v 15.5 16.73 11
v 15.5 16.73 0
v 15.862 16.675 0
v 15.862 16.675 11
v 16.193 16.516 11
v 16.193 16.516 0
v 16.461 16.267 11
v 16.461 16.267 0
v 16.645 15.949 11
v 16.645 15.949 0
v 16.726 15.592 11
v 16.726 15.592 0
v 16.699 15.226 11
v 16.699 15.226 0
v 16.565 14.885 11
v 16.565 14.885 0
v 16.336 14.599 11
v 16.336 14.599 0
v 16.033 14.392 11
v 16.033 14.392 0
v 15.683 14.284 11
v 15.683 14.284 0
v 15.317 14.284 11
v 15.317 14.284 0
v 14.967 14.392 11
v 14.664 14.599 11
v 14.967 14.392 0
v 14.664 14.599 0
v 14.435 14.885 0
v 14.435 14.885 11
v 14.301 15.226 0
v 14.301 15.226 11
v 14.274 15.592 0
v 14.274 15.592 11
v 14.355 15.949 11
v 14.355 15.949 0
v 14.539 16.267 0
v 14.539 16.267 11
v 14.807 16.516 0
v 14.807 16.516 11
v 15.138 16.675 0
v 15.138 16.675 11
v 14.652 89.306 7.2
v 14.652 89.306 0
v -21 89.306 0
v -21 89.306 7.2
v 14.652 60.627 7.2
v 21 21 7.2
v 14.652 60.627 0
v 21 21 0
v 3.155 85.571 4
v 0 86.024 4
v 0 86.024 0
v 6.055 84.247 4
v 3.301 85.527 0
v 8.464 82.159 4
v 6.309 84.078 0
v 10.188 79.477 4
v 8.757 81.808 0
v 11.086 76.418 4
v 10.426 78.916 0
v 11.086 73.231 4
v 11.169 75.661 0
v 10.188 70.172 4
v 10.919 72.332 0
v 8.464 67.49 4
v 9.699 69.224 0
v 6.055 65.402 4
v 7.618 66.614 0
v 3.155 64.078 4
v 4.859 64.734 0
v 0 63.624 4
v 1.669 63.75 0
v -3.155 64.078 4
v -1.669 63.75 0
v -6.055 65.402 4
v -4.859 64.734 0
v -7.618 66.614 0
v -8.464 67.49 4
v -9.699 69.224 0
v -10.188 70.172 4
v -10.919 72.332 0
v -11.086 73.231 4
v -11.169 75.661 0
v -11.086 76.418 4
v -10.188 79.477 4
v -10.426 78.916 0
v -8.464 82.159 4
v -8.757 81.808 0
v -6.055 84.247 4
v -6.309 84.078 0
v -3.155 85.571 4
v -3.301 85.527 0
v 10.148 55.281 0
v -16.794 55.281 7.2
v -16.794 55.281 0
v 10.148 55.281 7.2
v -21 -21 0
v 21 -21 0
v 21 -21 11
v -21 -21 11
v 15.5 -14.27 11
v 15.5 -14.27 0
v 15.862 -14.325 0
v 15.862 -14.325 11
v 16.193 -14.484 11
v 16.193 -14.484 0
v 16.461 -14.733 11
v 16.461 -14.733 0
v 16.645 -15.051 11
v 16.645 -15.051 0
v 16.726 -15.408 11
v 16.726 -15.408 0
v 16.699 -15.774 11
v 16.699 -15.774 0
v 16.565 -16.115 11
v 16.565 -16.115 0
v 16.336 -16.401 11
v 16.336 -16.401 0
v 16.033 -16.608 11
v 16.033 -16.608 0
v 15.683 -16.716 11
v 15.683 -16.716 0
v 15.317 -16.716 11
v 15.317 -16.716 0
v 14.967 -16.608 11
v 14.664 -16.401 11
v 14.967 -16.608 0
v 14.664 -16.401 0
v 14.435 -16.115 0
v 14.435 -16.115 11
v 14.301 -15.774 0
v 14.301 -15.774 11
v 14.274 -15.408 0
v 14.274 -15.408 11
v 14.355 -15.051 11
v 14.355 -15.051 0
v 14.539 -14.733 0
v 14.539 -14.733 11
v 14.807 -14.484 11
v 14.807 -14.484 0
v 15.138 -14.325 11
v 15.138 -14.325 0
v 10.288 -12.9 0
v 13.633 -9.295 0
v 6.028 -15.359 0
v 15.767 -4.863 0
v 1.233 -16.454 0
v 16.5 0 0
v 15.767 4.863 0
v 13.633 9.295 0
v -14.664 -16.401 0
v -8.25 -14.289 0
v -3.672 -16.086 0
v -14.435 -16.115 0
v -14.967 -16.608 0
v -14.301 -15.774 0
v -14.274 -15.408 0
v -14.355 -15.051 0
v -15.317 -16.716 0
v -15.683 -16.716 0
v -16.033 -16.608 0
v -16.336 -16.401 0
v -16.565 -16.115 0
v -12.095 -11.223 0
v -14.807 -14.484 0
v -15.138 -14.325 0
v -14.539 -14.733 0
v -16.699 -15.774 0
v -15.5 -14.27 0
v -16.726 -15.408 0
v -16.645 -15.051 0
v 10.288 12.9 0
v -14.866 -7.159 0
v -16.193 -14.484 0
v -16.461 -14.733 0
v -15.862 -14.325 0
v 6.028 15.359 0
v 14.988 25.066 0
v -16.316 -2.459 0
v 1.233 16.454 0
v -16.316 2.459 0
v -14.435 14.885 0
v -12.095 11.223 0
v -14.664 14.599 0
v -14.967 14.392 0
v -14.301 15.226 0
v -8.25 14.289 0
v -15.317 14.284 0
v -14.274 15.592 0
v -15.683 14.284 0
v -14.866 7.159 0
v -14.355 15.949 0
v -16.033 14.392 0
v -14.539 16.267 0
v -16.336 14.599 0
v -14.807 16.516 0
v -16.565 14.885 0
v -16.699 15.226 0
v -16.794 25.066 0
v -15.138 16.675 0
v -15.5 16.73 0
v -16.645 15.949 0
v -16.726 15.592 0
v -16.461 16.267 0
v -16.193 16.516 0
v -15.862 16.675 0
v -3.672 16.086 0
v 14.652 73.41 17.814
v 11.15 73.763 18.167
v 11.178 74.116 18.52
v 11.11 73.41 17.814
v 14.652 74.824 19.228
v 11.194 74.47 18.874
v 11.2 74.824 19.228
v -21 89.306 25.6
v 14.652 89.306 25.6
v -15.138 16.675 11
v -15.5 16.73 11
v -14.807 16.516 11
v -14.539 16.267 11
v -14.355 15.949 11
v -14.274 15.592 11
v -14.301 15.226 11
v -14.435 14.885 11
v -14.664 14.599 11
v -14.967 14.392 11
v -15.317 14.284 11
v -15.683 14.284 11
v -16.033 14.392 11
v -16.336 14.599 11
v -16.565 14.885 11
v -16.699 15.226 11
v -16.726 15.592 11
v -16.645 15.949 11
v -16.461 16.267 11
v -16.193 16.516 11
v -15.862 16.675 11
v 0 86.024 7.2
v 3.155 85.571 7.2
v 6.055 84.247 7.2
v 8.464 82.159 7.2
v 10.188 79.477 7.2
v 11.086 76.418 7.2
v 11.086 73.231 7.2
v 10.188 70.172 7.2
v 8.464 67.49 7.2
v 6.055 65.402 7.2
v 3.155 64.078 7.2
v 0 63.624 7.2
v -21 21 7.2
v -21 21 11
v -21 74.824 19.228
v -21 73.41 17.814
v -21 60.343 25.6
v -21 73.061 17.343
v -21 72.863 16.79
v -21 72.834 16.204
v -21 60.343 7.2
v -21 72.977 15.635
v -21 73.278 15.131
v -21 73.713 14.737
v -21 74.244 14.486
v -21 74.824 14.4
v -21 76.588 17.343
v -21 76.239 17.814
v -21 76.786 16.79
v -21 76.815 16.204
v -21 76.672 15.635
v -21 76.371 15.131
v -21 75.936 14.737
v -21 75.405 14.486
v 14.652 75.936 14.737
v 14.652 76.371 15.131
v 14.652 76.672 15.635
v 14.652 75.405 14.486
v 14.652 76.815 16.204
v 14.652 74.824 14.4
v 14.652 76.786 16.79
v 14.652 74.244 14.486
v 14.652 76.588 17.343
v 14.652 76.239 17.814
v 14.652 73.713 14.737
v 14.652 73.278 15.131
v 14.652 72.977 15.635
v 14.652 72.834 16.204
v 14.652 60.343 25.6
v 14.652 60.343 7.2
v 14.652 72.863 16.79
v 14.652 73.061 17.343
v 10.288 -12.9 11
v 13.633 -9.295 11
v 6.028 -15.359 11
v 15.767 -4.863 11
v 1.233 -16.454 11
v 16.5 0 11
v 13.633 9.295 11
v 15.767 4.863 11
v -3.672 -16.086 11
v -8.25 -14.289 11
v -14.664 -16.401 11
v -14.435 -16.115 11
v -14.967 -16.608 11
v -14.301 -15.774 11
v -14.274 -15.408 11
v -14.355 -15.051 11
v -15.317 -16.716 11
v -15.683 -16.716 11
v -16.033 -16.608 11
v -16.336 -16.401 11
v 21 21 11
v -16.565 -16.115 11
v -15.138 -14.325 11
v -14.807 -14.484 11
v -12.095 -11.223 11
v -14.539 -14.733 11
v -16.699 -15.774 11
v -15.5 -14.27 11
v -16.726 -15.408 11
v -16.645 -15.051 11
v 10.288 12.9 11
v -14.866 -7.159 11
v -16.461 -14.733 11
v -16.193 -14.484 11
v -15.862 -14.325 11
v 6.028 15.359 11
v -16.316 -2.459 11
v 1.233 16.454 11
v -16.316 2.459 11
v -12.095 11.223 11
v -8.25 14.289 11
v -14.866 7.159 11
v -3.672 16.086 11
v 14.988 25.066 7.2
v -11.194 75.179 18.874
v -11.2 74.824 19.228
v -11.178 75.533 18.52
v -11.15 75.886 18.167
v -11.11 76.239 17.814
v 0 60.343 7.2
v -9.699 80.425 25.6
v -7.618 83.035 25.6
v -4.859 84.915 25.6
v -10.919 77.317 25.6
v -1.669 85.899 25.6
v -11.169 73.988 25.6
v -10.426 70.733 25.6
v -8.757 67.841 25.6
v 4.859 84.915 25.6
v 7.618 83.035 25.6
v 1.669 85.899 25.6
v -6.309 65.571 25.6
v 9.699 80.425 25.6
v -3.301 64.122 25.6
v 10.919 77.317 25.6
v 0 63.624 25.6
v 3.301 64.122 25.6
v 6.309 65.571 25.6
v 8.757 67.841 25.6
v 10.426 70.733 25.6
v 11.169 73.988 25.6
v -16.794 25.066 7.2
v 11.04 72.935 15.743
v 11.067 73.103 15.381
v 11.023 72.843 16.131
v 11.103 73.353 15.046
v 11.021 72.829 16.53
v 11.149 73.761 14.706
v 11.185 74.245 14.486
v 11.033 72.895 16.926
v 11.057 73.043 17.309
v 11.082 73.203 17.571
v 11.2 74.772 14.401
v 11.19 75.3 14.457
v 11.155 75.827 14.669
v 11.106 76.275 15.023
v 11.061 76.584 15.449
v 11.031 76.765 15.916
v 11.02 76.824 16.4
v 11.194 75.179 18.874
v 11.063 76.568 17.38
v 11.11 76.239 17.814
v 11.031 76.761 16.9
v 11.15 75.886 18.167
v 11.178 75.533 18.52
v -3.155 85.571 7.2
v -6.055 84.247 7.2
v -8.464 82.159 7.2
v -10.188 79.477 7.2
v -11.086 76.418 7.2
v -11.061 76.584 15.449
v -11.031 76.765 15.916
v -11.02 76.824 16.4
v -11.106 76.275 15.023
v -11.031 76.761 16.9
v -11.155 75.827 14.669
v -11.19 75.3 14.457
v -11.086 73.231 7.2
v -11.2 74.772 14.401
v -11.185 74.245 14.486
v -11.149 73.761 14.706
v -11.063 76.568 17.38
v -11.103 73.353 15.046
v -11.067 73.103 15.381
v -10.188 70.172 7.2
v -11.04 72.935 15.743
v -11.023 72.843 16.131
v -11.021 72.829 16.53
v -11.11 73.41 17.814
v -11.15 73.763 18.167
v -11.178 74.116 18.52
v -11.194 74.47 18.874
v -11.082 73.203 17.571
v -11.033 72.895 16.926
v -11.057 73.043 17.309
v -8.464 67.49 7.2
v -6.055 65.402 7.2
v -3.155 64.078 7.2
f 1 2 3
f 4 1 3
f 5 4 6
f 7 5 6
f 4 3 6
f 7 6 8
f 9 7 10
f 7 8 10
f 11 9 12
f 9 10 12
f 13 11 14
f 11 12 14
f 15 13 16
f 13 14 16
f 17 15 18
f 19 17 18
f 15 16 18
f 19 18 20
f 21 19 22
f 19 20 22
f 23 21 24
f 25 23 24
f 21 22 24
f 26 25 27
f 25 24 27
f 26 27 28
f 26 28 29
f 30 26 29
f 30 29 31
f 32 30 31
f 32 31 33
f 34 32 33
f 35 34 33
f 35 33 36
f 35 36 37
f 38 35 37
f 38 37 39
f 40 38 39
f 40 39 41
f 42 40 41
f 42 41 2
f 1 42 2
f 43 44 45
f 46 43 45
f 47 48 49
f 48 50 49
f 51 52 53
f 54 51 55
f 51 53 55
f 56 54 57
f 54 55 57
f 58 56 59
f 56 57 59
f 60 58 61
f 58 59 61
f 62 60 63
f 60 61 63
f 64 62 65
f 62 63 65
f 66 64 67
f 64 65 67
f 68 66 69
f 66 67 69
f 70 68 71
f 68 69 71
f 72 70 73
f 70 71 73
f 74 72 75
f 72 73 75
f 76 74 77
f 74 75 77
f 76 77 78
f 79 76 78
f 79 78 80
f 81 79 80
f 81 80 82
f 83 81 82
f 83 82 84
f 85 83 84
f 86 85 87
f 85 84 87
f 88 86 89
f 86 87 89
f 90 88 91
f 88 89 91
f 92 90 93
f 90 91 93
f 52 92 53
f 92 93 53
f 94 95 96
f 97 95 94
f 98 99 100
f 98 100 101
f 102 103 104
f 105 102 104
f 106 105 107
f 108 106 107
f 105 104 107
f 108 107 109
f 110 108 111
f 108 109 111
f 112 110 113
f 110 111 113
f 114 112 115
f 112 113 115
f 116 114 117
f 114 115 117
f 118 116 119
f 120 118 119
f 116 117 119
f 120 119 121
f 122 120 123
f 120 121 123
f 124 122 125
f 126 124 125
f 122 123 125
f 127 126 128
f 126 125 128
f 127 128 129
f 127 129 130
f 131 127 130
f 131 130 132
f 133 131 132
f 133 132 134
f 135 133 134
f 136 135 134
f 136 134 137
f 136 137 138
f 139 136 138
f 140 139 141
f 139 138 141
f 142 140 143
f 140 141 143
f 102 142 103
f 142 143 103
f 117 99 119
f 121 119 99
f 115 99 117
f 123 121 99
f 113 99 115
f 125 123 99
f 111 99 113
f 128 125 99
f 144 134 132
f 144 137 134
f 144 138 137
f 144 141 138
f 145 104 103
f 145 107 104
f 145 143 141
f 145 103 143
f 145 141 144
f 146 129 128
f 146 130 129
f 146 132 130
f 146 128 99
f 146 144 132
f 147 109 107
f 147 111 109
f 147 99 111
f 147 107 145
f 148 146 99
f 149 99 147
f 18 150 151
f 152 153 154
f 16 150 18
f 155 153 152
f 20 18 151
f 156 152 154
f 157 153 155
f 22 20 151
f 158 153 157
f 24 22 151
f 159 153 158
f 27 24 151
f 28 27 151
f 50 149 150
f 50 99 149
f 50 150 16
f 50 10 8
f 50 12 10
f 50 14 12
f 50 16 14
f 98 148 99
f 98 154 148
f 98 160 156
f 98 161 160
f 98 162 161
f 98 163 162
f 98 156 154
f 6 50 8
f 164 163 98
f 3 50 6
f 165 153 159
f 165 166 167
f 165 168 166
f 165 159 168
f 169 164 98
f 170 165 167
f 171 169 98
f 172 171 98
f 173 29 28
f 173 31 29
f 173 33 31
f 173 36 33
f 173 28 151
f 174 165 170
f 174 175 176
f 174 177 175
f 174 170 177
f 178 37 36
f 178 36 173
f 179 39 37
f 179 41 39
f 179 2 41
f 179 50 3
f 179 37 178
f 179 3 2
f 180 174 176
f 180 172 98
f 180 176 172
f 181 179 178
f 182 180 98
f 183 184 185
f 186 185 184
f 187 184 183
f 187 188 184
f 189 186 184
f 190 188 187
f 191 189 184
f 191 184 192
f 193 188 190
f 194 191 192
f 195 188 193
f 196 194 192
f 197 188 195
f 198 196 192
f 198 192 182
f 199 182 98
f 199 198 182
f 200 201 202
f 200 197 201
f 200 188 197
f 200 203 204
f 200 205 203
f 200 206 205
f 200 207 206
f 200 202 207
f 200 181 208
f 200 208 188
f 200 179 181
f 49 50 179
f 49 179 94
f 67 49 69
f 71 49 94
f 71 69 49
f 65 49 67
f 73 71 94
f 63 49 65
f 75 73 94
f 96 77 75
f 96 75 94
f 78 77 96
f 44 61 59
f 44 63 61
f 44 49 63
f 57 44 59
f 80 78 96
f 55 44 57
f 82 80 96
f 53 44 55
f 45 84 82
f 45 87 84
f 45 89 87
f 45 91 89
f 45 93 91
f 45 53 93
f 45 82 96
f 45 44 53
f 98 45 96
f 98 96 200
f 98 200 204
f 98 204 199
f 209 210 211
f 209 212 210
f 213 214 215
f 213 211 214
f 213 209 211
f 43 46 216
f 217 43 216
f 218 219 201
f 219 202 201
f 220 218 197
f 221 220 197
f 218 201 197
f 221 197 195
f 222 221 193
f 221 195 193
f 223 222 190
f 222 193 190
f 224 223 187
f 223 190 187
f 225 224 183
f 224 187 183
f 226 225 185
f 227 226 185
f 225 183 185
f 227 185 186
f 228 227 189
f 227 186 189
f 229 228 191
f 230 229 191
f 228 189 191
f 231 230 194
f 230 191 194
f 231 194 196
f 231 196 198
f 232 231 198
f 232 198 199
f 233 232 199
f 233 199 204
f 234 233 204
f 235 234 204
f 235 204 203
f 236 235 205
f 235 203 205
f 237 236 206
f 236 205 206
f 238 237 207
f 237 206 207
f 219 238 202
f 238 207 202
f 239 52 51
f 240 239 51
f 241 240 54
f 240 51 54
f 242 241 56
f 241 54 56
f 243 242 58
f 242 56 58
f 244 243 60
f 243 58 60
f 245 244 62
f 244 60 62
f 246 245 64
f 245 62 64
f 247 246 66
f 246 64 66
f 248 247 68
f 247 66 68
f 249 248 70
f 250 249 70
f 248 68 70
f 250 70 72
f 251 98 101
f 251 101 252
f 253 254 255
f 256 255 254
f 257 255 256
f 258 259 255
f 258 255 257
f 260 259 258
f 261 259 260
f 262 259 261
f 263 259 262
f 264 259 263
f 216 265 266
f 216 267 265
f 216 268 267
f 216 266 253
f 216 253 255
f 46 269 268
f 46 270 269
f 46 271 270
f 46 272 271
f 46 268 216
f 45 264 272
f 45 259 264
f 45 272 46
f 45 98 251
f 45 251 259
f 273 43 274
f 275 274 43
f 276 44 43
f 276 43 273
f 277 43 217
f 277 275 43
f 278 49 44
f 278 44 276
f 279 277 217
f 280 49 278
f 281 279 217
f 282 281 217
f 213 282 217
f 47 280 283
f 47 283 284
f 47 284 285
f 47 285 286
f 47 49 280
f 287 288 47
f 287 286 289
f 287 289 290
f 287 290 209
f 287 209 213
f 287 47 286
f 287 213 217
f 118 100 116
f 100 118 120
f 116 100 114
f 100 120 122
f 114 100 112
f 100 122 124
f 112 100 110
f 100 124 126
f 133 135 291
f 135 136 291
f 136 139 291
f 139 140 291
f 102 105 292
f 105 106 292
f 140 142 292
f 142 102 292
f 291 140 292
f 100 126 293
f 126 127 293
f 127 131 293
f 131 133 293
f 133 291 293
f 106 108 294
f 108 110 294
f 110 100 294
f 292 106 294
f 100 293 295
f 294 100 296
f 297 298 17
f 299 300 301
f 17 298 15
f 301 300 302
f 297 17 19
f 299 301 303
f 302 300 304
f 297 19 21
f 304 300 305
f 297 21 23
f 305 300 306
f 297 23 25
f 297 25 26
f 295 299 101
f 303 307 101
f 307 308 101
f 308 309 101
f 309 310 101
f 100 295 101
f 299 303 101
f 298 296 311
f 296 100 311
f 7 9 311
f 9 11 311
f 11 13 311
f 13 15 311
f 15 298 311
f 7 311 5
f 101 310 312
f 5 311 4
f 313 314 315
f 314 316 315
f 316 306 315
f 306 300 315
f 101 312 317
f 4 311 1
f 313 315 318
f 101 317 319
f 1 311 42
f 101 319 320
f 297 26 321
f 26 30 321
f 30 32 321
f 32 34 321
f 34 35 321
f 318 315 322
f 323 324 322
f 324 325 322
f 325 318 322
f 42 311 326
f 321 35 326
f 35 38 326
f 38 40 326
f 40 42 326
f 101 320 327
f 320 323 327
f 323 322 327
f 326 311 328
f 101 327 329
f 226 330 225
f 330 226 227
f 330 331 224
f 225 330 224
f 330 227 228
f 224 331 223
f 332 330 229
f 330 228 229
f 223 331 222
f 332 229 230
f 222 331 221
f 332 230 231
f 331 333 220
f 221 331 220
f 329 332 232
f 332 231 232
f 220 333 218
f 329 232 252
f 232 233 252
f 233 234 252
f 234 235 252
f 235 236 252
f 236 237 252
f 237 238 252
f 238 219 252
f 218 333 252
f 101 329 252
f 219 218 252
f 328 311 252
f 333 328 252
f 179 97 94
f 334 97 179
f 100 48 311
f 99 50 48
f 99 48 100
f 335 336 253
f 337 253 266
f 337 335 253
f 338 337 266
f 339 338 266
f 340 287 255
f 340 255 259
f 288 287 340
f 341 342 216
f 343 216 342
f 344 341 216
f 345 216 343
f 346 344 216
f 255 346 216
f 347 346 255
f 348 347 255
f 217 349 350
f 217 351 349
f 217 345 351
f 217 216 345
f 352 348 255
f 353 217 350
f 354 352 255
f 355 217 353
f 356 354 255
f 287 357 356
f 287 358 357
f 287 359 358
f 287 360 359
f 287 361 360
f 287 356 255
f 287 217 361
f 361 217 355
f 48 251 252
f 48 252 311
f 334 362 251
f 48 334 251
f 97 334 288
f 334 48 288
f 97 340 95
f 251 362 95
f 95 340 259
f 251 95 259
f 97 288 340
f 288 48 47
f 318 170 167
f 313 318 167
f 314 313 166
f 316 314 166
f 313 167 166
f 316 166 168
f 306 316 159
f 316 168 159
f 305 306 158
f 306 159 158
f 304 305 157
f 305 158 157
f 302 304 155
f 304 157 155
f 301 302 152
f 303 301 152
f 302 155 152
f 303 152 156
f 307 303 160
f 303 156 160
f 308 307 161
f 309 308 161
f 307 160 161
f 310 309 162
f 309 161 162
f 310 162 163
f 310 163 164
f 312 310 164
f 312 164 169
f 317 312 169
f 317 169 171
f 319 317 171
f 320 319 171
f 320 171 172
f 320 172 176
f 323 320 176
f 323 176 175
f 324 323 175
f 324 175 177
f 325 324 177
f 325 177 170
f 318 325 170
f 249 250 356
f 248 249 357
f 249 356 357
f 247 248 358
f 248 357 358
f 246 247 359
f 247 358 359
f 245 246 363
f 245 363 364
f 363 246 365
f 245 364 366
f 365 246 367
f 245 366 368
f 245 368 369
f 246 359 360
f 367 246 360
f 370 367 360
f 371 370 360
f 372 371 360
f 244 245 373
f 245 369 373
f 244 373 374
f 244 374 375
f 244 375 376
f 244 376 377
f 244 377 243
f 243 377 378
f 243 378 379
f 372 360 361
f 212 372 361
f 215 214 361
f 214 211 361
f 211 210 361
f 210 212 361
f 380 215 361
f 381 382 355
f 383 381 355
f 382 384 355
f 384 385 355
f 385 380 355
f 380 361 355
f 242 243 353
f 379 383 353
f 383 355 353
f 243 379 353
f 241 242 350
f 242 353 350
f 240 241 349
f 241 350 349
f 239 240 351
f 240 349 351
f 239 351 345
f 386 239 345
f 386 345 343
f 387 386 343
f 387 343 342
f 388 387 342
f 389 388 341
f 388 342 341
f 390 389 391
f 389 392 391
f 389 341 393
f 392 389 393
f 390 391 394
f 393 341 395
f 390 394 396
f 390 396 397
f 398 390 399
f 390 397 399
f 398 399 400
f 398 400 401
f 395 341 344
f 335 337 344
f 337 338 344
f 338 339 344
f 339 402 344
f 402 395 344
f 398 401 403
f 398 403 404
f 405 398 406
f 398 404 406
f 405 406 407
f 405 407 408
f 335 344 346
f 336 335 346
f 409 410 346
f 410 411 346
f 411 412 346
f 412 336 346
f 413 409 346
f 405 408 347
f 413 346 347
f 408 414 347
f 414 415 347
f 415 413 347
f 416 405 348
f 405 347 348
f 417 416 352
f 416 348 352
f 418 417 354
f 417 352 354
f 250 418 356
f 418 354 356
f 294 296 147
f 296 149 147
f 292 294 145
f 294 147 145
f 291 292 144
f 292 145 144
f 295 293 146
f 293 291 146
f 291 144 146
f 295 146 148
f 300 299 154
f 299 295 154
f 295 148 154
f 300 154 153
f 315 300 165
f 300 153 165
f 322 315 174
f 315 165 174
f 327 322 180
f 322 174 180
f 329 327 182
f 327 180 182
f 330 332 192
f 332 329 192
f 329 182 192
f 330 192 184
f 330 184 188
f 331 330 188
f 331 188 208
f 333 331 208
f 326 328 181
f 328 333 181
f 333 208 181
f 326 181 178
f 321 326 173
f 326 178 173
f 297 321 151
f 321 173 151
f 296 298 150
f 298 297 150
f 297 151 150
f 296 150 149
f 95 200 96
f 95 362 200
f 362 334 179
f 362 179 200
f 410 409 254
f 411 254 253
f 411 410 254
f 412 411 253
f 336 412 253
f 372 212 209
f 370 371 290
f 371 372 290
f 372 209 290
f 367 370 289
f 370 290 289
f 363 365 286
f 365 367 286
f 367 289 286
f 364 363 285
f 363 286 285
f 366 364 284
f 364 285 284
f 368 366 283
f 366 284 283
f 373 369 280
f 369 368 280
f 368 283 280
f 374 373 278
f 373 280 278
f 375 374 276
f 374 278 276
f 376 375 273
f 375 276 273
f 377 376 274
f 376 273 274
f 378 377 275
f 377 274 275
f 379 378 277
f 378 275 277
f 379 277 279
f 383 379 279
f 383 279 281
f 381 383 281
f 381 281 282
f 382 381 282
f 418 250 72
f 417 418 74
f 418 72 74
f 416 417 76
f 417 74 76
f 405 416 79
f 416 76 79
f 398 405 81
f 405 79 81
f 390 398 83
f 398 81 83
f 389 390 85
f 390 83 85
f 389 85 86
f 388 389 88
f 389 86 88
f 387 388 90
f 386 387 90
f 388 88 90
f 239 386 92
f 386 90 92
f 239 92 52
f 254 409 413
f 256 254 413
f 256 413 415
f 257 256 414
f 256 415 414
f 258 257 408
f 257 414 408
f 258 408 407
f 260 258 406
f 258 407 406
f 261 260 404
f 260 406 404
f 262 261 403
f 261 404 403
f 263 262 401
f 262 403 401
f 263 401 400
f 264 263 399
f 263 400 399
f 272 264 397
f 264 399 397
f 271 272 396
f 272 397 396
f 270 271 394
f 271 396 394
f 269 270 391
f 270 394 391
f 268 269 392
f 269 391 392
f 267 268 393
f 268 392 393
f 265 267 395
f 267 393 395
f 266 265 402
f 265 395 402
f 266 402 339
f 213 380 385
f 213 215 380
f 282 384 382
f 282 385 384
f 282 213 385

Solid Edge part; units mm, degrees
sketch "Sketch1" plane through (0, 0, 0) normal (0, 0, 1) x (1, 0, 0)
  circle A0 centre (0, 0) radius 16.5
  line L0 (-21, 21) -> (21, 21)
  line L1 (21, 21) -> (21, -21)
  line L2 (21, -21) -> (-21, -21)
  line L3 (-21, -21) -> (-21, 21)
extrude "Protrusion1" add sketch "Sketch1" along normal blind 11
sketch "Sketch2" plane through (0, 0, 0) normal (0, 0, -1) x (0, 1, 0)
  circle A0 centre (-15.5, 15.5) radius 1.2295
  circle A1 centre (15.5, 15.5) radius 1.2295
  circle A2 centre (-15.5, -15.5) radius 1.2295
  circle A3 centre (15.5, -15.5) radius 1.2295
extrude "ExtrudedCutout_1" cut sketch "Sketch2" against normal blind 24
sketch "Sketch3" plane through (0, 0, 0) normal (0, 0, -1) x (0, 1, 0)
  circle A0 centre (74.8245, 0) radius 11.2
  line L0 (21, 21) -> (21, -21)
  line L1 (89.3061, -21) -> (21, -21)
  line L2 (89.3061, 14.6519) -> (89.3061, -21)
  line L3 (60.6266, 14.6519) -> (89.3061, 14.6519)
  line L4 (21, 21) -> (60.6266, 14.6519)
extrude "Protrusion2" add sketch "Sketch3" against normal up to vertex (7.2 mm away)
sketch "Sketch4" plane through (0, 55.1531, 7.2) normal (0, 0, 1) x (0, 1, 0)
  line L0 (-30.0866, 16.7943) -> (0.1278, 16.7943)
  line L1 (0.1278, 16.7943) -> (0.1278, -10.1482)
  line L2 (0.1278, -10.1482) -> (-30.0866, -14.9885)
  line L3 (-30.0866, -14.9885) -> (-30.0866, 16.7943)
extrude "ExtrudedCutout_3" cut sketch "Sketch4" against normal blind 194
sketch "Sketch5" plane through (0, 55.1531, 7.2) normal (0, 0, 1) x (0, 1, 0)
  circle A0 centre (19.6714, 0) radius 14.4816
  circle A1 centre (19.6714, 0) radius 4.75
extrude "ExtrudedProtrusion_3" add sketch "Sketch5" along normal blind 3
sketch "Sketch6" plane through (14.6519, 74.9664, 3.6) normal (1, 0, 0) x (0, 1, 0)
  line L0 (-14.6235, 3.6) -> (14.3398, 3.6)
  line L1 (14.3398, 3.6) -> (14.3398, 22)
  line L2 (14.3398, 22) -> (-14.6235, 22)
  line L3 (-14.6235, 22) -> (-14.6235, 3.6)
  line L4 (-1.5561, 14.2142) -> (-0.1419, 15.6284)
  line L5 (-0.1419, 15.6284) -> (1.2723, 14.2142)
  arc A0 (1.2723, 14.2142) -> (-1.5561, 14.2142) centre (-0.1419, 12.8) cw
extrude "Protrusion3" add sketch "Sketch6" against normal up to vertex (35.6519 mm away)
sketch "Sketch7" plane through (0, 34.1531, 0) normal (0, 0, -1) x (1, 0, 0)
  circle A0 centre (0, -40.6714) radius 2.5
extrude "ExtrudedCutout_4" cut sketch "Sketch7" against normal blind 682
sketch "Sketch8" plane through (-3.1741, 74.8245, 25.6) normal (0, 0, 1) x (0, -1, 0)
  circle A0 centre (0, 3.1741) radius 11.2
extrude "ExtrudedCutout_5" cut sketch "Sketch8" against normal blind 21.6
